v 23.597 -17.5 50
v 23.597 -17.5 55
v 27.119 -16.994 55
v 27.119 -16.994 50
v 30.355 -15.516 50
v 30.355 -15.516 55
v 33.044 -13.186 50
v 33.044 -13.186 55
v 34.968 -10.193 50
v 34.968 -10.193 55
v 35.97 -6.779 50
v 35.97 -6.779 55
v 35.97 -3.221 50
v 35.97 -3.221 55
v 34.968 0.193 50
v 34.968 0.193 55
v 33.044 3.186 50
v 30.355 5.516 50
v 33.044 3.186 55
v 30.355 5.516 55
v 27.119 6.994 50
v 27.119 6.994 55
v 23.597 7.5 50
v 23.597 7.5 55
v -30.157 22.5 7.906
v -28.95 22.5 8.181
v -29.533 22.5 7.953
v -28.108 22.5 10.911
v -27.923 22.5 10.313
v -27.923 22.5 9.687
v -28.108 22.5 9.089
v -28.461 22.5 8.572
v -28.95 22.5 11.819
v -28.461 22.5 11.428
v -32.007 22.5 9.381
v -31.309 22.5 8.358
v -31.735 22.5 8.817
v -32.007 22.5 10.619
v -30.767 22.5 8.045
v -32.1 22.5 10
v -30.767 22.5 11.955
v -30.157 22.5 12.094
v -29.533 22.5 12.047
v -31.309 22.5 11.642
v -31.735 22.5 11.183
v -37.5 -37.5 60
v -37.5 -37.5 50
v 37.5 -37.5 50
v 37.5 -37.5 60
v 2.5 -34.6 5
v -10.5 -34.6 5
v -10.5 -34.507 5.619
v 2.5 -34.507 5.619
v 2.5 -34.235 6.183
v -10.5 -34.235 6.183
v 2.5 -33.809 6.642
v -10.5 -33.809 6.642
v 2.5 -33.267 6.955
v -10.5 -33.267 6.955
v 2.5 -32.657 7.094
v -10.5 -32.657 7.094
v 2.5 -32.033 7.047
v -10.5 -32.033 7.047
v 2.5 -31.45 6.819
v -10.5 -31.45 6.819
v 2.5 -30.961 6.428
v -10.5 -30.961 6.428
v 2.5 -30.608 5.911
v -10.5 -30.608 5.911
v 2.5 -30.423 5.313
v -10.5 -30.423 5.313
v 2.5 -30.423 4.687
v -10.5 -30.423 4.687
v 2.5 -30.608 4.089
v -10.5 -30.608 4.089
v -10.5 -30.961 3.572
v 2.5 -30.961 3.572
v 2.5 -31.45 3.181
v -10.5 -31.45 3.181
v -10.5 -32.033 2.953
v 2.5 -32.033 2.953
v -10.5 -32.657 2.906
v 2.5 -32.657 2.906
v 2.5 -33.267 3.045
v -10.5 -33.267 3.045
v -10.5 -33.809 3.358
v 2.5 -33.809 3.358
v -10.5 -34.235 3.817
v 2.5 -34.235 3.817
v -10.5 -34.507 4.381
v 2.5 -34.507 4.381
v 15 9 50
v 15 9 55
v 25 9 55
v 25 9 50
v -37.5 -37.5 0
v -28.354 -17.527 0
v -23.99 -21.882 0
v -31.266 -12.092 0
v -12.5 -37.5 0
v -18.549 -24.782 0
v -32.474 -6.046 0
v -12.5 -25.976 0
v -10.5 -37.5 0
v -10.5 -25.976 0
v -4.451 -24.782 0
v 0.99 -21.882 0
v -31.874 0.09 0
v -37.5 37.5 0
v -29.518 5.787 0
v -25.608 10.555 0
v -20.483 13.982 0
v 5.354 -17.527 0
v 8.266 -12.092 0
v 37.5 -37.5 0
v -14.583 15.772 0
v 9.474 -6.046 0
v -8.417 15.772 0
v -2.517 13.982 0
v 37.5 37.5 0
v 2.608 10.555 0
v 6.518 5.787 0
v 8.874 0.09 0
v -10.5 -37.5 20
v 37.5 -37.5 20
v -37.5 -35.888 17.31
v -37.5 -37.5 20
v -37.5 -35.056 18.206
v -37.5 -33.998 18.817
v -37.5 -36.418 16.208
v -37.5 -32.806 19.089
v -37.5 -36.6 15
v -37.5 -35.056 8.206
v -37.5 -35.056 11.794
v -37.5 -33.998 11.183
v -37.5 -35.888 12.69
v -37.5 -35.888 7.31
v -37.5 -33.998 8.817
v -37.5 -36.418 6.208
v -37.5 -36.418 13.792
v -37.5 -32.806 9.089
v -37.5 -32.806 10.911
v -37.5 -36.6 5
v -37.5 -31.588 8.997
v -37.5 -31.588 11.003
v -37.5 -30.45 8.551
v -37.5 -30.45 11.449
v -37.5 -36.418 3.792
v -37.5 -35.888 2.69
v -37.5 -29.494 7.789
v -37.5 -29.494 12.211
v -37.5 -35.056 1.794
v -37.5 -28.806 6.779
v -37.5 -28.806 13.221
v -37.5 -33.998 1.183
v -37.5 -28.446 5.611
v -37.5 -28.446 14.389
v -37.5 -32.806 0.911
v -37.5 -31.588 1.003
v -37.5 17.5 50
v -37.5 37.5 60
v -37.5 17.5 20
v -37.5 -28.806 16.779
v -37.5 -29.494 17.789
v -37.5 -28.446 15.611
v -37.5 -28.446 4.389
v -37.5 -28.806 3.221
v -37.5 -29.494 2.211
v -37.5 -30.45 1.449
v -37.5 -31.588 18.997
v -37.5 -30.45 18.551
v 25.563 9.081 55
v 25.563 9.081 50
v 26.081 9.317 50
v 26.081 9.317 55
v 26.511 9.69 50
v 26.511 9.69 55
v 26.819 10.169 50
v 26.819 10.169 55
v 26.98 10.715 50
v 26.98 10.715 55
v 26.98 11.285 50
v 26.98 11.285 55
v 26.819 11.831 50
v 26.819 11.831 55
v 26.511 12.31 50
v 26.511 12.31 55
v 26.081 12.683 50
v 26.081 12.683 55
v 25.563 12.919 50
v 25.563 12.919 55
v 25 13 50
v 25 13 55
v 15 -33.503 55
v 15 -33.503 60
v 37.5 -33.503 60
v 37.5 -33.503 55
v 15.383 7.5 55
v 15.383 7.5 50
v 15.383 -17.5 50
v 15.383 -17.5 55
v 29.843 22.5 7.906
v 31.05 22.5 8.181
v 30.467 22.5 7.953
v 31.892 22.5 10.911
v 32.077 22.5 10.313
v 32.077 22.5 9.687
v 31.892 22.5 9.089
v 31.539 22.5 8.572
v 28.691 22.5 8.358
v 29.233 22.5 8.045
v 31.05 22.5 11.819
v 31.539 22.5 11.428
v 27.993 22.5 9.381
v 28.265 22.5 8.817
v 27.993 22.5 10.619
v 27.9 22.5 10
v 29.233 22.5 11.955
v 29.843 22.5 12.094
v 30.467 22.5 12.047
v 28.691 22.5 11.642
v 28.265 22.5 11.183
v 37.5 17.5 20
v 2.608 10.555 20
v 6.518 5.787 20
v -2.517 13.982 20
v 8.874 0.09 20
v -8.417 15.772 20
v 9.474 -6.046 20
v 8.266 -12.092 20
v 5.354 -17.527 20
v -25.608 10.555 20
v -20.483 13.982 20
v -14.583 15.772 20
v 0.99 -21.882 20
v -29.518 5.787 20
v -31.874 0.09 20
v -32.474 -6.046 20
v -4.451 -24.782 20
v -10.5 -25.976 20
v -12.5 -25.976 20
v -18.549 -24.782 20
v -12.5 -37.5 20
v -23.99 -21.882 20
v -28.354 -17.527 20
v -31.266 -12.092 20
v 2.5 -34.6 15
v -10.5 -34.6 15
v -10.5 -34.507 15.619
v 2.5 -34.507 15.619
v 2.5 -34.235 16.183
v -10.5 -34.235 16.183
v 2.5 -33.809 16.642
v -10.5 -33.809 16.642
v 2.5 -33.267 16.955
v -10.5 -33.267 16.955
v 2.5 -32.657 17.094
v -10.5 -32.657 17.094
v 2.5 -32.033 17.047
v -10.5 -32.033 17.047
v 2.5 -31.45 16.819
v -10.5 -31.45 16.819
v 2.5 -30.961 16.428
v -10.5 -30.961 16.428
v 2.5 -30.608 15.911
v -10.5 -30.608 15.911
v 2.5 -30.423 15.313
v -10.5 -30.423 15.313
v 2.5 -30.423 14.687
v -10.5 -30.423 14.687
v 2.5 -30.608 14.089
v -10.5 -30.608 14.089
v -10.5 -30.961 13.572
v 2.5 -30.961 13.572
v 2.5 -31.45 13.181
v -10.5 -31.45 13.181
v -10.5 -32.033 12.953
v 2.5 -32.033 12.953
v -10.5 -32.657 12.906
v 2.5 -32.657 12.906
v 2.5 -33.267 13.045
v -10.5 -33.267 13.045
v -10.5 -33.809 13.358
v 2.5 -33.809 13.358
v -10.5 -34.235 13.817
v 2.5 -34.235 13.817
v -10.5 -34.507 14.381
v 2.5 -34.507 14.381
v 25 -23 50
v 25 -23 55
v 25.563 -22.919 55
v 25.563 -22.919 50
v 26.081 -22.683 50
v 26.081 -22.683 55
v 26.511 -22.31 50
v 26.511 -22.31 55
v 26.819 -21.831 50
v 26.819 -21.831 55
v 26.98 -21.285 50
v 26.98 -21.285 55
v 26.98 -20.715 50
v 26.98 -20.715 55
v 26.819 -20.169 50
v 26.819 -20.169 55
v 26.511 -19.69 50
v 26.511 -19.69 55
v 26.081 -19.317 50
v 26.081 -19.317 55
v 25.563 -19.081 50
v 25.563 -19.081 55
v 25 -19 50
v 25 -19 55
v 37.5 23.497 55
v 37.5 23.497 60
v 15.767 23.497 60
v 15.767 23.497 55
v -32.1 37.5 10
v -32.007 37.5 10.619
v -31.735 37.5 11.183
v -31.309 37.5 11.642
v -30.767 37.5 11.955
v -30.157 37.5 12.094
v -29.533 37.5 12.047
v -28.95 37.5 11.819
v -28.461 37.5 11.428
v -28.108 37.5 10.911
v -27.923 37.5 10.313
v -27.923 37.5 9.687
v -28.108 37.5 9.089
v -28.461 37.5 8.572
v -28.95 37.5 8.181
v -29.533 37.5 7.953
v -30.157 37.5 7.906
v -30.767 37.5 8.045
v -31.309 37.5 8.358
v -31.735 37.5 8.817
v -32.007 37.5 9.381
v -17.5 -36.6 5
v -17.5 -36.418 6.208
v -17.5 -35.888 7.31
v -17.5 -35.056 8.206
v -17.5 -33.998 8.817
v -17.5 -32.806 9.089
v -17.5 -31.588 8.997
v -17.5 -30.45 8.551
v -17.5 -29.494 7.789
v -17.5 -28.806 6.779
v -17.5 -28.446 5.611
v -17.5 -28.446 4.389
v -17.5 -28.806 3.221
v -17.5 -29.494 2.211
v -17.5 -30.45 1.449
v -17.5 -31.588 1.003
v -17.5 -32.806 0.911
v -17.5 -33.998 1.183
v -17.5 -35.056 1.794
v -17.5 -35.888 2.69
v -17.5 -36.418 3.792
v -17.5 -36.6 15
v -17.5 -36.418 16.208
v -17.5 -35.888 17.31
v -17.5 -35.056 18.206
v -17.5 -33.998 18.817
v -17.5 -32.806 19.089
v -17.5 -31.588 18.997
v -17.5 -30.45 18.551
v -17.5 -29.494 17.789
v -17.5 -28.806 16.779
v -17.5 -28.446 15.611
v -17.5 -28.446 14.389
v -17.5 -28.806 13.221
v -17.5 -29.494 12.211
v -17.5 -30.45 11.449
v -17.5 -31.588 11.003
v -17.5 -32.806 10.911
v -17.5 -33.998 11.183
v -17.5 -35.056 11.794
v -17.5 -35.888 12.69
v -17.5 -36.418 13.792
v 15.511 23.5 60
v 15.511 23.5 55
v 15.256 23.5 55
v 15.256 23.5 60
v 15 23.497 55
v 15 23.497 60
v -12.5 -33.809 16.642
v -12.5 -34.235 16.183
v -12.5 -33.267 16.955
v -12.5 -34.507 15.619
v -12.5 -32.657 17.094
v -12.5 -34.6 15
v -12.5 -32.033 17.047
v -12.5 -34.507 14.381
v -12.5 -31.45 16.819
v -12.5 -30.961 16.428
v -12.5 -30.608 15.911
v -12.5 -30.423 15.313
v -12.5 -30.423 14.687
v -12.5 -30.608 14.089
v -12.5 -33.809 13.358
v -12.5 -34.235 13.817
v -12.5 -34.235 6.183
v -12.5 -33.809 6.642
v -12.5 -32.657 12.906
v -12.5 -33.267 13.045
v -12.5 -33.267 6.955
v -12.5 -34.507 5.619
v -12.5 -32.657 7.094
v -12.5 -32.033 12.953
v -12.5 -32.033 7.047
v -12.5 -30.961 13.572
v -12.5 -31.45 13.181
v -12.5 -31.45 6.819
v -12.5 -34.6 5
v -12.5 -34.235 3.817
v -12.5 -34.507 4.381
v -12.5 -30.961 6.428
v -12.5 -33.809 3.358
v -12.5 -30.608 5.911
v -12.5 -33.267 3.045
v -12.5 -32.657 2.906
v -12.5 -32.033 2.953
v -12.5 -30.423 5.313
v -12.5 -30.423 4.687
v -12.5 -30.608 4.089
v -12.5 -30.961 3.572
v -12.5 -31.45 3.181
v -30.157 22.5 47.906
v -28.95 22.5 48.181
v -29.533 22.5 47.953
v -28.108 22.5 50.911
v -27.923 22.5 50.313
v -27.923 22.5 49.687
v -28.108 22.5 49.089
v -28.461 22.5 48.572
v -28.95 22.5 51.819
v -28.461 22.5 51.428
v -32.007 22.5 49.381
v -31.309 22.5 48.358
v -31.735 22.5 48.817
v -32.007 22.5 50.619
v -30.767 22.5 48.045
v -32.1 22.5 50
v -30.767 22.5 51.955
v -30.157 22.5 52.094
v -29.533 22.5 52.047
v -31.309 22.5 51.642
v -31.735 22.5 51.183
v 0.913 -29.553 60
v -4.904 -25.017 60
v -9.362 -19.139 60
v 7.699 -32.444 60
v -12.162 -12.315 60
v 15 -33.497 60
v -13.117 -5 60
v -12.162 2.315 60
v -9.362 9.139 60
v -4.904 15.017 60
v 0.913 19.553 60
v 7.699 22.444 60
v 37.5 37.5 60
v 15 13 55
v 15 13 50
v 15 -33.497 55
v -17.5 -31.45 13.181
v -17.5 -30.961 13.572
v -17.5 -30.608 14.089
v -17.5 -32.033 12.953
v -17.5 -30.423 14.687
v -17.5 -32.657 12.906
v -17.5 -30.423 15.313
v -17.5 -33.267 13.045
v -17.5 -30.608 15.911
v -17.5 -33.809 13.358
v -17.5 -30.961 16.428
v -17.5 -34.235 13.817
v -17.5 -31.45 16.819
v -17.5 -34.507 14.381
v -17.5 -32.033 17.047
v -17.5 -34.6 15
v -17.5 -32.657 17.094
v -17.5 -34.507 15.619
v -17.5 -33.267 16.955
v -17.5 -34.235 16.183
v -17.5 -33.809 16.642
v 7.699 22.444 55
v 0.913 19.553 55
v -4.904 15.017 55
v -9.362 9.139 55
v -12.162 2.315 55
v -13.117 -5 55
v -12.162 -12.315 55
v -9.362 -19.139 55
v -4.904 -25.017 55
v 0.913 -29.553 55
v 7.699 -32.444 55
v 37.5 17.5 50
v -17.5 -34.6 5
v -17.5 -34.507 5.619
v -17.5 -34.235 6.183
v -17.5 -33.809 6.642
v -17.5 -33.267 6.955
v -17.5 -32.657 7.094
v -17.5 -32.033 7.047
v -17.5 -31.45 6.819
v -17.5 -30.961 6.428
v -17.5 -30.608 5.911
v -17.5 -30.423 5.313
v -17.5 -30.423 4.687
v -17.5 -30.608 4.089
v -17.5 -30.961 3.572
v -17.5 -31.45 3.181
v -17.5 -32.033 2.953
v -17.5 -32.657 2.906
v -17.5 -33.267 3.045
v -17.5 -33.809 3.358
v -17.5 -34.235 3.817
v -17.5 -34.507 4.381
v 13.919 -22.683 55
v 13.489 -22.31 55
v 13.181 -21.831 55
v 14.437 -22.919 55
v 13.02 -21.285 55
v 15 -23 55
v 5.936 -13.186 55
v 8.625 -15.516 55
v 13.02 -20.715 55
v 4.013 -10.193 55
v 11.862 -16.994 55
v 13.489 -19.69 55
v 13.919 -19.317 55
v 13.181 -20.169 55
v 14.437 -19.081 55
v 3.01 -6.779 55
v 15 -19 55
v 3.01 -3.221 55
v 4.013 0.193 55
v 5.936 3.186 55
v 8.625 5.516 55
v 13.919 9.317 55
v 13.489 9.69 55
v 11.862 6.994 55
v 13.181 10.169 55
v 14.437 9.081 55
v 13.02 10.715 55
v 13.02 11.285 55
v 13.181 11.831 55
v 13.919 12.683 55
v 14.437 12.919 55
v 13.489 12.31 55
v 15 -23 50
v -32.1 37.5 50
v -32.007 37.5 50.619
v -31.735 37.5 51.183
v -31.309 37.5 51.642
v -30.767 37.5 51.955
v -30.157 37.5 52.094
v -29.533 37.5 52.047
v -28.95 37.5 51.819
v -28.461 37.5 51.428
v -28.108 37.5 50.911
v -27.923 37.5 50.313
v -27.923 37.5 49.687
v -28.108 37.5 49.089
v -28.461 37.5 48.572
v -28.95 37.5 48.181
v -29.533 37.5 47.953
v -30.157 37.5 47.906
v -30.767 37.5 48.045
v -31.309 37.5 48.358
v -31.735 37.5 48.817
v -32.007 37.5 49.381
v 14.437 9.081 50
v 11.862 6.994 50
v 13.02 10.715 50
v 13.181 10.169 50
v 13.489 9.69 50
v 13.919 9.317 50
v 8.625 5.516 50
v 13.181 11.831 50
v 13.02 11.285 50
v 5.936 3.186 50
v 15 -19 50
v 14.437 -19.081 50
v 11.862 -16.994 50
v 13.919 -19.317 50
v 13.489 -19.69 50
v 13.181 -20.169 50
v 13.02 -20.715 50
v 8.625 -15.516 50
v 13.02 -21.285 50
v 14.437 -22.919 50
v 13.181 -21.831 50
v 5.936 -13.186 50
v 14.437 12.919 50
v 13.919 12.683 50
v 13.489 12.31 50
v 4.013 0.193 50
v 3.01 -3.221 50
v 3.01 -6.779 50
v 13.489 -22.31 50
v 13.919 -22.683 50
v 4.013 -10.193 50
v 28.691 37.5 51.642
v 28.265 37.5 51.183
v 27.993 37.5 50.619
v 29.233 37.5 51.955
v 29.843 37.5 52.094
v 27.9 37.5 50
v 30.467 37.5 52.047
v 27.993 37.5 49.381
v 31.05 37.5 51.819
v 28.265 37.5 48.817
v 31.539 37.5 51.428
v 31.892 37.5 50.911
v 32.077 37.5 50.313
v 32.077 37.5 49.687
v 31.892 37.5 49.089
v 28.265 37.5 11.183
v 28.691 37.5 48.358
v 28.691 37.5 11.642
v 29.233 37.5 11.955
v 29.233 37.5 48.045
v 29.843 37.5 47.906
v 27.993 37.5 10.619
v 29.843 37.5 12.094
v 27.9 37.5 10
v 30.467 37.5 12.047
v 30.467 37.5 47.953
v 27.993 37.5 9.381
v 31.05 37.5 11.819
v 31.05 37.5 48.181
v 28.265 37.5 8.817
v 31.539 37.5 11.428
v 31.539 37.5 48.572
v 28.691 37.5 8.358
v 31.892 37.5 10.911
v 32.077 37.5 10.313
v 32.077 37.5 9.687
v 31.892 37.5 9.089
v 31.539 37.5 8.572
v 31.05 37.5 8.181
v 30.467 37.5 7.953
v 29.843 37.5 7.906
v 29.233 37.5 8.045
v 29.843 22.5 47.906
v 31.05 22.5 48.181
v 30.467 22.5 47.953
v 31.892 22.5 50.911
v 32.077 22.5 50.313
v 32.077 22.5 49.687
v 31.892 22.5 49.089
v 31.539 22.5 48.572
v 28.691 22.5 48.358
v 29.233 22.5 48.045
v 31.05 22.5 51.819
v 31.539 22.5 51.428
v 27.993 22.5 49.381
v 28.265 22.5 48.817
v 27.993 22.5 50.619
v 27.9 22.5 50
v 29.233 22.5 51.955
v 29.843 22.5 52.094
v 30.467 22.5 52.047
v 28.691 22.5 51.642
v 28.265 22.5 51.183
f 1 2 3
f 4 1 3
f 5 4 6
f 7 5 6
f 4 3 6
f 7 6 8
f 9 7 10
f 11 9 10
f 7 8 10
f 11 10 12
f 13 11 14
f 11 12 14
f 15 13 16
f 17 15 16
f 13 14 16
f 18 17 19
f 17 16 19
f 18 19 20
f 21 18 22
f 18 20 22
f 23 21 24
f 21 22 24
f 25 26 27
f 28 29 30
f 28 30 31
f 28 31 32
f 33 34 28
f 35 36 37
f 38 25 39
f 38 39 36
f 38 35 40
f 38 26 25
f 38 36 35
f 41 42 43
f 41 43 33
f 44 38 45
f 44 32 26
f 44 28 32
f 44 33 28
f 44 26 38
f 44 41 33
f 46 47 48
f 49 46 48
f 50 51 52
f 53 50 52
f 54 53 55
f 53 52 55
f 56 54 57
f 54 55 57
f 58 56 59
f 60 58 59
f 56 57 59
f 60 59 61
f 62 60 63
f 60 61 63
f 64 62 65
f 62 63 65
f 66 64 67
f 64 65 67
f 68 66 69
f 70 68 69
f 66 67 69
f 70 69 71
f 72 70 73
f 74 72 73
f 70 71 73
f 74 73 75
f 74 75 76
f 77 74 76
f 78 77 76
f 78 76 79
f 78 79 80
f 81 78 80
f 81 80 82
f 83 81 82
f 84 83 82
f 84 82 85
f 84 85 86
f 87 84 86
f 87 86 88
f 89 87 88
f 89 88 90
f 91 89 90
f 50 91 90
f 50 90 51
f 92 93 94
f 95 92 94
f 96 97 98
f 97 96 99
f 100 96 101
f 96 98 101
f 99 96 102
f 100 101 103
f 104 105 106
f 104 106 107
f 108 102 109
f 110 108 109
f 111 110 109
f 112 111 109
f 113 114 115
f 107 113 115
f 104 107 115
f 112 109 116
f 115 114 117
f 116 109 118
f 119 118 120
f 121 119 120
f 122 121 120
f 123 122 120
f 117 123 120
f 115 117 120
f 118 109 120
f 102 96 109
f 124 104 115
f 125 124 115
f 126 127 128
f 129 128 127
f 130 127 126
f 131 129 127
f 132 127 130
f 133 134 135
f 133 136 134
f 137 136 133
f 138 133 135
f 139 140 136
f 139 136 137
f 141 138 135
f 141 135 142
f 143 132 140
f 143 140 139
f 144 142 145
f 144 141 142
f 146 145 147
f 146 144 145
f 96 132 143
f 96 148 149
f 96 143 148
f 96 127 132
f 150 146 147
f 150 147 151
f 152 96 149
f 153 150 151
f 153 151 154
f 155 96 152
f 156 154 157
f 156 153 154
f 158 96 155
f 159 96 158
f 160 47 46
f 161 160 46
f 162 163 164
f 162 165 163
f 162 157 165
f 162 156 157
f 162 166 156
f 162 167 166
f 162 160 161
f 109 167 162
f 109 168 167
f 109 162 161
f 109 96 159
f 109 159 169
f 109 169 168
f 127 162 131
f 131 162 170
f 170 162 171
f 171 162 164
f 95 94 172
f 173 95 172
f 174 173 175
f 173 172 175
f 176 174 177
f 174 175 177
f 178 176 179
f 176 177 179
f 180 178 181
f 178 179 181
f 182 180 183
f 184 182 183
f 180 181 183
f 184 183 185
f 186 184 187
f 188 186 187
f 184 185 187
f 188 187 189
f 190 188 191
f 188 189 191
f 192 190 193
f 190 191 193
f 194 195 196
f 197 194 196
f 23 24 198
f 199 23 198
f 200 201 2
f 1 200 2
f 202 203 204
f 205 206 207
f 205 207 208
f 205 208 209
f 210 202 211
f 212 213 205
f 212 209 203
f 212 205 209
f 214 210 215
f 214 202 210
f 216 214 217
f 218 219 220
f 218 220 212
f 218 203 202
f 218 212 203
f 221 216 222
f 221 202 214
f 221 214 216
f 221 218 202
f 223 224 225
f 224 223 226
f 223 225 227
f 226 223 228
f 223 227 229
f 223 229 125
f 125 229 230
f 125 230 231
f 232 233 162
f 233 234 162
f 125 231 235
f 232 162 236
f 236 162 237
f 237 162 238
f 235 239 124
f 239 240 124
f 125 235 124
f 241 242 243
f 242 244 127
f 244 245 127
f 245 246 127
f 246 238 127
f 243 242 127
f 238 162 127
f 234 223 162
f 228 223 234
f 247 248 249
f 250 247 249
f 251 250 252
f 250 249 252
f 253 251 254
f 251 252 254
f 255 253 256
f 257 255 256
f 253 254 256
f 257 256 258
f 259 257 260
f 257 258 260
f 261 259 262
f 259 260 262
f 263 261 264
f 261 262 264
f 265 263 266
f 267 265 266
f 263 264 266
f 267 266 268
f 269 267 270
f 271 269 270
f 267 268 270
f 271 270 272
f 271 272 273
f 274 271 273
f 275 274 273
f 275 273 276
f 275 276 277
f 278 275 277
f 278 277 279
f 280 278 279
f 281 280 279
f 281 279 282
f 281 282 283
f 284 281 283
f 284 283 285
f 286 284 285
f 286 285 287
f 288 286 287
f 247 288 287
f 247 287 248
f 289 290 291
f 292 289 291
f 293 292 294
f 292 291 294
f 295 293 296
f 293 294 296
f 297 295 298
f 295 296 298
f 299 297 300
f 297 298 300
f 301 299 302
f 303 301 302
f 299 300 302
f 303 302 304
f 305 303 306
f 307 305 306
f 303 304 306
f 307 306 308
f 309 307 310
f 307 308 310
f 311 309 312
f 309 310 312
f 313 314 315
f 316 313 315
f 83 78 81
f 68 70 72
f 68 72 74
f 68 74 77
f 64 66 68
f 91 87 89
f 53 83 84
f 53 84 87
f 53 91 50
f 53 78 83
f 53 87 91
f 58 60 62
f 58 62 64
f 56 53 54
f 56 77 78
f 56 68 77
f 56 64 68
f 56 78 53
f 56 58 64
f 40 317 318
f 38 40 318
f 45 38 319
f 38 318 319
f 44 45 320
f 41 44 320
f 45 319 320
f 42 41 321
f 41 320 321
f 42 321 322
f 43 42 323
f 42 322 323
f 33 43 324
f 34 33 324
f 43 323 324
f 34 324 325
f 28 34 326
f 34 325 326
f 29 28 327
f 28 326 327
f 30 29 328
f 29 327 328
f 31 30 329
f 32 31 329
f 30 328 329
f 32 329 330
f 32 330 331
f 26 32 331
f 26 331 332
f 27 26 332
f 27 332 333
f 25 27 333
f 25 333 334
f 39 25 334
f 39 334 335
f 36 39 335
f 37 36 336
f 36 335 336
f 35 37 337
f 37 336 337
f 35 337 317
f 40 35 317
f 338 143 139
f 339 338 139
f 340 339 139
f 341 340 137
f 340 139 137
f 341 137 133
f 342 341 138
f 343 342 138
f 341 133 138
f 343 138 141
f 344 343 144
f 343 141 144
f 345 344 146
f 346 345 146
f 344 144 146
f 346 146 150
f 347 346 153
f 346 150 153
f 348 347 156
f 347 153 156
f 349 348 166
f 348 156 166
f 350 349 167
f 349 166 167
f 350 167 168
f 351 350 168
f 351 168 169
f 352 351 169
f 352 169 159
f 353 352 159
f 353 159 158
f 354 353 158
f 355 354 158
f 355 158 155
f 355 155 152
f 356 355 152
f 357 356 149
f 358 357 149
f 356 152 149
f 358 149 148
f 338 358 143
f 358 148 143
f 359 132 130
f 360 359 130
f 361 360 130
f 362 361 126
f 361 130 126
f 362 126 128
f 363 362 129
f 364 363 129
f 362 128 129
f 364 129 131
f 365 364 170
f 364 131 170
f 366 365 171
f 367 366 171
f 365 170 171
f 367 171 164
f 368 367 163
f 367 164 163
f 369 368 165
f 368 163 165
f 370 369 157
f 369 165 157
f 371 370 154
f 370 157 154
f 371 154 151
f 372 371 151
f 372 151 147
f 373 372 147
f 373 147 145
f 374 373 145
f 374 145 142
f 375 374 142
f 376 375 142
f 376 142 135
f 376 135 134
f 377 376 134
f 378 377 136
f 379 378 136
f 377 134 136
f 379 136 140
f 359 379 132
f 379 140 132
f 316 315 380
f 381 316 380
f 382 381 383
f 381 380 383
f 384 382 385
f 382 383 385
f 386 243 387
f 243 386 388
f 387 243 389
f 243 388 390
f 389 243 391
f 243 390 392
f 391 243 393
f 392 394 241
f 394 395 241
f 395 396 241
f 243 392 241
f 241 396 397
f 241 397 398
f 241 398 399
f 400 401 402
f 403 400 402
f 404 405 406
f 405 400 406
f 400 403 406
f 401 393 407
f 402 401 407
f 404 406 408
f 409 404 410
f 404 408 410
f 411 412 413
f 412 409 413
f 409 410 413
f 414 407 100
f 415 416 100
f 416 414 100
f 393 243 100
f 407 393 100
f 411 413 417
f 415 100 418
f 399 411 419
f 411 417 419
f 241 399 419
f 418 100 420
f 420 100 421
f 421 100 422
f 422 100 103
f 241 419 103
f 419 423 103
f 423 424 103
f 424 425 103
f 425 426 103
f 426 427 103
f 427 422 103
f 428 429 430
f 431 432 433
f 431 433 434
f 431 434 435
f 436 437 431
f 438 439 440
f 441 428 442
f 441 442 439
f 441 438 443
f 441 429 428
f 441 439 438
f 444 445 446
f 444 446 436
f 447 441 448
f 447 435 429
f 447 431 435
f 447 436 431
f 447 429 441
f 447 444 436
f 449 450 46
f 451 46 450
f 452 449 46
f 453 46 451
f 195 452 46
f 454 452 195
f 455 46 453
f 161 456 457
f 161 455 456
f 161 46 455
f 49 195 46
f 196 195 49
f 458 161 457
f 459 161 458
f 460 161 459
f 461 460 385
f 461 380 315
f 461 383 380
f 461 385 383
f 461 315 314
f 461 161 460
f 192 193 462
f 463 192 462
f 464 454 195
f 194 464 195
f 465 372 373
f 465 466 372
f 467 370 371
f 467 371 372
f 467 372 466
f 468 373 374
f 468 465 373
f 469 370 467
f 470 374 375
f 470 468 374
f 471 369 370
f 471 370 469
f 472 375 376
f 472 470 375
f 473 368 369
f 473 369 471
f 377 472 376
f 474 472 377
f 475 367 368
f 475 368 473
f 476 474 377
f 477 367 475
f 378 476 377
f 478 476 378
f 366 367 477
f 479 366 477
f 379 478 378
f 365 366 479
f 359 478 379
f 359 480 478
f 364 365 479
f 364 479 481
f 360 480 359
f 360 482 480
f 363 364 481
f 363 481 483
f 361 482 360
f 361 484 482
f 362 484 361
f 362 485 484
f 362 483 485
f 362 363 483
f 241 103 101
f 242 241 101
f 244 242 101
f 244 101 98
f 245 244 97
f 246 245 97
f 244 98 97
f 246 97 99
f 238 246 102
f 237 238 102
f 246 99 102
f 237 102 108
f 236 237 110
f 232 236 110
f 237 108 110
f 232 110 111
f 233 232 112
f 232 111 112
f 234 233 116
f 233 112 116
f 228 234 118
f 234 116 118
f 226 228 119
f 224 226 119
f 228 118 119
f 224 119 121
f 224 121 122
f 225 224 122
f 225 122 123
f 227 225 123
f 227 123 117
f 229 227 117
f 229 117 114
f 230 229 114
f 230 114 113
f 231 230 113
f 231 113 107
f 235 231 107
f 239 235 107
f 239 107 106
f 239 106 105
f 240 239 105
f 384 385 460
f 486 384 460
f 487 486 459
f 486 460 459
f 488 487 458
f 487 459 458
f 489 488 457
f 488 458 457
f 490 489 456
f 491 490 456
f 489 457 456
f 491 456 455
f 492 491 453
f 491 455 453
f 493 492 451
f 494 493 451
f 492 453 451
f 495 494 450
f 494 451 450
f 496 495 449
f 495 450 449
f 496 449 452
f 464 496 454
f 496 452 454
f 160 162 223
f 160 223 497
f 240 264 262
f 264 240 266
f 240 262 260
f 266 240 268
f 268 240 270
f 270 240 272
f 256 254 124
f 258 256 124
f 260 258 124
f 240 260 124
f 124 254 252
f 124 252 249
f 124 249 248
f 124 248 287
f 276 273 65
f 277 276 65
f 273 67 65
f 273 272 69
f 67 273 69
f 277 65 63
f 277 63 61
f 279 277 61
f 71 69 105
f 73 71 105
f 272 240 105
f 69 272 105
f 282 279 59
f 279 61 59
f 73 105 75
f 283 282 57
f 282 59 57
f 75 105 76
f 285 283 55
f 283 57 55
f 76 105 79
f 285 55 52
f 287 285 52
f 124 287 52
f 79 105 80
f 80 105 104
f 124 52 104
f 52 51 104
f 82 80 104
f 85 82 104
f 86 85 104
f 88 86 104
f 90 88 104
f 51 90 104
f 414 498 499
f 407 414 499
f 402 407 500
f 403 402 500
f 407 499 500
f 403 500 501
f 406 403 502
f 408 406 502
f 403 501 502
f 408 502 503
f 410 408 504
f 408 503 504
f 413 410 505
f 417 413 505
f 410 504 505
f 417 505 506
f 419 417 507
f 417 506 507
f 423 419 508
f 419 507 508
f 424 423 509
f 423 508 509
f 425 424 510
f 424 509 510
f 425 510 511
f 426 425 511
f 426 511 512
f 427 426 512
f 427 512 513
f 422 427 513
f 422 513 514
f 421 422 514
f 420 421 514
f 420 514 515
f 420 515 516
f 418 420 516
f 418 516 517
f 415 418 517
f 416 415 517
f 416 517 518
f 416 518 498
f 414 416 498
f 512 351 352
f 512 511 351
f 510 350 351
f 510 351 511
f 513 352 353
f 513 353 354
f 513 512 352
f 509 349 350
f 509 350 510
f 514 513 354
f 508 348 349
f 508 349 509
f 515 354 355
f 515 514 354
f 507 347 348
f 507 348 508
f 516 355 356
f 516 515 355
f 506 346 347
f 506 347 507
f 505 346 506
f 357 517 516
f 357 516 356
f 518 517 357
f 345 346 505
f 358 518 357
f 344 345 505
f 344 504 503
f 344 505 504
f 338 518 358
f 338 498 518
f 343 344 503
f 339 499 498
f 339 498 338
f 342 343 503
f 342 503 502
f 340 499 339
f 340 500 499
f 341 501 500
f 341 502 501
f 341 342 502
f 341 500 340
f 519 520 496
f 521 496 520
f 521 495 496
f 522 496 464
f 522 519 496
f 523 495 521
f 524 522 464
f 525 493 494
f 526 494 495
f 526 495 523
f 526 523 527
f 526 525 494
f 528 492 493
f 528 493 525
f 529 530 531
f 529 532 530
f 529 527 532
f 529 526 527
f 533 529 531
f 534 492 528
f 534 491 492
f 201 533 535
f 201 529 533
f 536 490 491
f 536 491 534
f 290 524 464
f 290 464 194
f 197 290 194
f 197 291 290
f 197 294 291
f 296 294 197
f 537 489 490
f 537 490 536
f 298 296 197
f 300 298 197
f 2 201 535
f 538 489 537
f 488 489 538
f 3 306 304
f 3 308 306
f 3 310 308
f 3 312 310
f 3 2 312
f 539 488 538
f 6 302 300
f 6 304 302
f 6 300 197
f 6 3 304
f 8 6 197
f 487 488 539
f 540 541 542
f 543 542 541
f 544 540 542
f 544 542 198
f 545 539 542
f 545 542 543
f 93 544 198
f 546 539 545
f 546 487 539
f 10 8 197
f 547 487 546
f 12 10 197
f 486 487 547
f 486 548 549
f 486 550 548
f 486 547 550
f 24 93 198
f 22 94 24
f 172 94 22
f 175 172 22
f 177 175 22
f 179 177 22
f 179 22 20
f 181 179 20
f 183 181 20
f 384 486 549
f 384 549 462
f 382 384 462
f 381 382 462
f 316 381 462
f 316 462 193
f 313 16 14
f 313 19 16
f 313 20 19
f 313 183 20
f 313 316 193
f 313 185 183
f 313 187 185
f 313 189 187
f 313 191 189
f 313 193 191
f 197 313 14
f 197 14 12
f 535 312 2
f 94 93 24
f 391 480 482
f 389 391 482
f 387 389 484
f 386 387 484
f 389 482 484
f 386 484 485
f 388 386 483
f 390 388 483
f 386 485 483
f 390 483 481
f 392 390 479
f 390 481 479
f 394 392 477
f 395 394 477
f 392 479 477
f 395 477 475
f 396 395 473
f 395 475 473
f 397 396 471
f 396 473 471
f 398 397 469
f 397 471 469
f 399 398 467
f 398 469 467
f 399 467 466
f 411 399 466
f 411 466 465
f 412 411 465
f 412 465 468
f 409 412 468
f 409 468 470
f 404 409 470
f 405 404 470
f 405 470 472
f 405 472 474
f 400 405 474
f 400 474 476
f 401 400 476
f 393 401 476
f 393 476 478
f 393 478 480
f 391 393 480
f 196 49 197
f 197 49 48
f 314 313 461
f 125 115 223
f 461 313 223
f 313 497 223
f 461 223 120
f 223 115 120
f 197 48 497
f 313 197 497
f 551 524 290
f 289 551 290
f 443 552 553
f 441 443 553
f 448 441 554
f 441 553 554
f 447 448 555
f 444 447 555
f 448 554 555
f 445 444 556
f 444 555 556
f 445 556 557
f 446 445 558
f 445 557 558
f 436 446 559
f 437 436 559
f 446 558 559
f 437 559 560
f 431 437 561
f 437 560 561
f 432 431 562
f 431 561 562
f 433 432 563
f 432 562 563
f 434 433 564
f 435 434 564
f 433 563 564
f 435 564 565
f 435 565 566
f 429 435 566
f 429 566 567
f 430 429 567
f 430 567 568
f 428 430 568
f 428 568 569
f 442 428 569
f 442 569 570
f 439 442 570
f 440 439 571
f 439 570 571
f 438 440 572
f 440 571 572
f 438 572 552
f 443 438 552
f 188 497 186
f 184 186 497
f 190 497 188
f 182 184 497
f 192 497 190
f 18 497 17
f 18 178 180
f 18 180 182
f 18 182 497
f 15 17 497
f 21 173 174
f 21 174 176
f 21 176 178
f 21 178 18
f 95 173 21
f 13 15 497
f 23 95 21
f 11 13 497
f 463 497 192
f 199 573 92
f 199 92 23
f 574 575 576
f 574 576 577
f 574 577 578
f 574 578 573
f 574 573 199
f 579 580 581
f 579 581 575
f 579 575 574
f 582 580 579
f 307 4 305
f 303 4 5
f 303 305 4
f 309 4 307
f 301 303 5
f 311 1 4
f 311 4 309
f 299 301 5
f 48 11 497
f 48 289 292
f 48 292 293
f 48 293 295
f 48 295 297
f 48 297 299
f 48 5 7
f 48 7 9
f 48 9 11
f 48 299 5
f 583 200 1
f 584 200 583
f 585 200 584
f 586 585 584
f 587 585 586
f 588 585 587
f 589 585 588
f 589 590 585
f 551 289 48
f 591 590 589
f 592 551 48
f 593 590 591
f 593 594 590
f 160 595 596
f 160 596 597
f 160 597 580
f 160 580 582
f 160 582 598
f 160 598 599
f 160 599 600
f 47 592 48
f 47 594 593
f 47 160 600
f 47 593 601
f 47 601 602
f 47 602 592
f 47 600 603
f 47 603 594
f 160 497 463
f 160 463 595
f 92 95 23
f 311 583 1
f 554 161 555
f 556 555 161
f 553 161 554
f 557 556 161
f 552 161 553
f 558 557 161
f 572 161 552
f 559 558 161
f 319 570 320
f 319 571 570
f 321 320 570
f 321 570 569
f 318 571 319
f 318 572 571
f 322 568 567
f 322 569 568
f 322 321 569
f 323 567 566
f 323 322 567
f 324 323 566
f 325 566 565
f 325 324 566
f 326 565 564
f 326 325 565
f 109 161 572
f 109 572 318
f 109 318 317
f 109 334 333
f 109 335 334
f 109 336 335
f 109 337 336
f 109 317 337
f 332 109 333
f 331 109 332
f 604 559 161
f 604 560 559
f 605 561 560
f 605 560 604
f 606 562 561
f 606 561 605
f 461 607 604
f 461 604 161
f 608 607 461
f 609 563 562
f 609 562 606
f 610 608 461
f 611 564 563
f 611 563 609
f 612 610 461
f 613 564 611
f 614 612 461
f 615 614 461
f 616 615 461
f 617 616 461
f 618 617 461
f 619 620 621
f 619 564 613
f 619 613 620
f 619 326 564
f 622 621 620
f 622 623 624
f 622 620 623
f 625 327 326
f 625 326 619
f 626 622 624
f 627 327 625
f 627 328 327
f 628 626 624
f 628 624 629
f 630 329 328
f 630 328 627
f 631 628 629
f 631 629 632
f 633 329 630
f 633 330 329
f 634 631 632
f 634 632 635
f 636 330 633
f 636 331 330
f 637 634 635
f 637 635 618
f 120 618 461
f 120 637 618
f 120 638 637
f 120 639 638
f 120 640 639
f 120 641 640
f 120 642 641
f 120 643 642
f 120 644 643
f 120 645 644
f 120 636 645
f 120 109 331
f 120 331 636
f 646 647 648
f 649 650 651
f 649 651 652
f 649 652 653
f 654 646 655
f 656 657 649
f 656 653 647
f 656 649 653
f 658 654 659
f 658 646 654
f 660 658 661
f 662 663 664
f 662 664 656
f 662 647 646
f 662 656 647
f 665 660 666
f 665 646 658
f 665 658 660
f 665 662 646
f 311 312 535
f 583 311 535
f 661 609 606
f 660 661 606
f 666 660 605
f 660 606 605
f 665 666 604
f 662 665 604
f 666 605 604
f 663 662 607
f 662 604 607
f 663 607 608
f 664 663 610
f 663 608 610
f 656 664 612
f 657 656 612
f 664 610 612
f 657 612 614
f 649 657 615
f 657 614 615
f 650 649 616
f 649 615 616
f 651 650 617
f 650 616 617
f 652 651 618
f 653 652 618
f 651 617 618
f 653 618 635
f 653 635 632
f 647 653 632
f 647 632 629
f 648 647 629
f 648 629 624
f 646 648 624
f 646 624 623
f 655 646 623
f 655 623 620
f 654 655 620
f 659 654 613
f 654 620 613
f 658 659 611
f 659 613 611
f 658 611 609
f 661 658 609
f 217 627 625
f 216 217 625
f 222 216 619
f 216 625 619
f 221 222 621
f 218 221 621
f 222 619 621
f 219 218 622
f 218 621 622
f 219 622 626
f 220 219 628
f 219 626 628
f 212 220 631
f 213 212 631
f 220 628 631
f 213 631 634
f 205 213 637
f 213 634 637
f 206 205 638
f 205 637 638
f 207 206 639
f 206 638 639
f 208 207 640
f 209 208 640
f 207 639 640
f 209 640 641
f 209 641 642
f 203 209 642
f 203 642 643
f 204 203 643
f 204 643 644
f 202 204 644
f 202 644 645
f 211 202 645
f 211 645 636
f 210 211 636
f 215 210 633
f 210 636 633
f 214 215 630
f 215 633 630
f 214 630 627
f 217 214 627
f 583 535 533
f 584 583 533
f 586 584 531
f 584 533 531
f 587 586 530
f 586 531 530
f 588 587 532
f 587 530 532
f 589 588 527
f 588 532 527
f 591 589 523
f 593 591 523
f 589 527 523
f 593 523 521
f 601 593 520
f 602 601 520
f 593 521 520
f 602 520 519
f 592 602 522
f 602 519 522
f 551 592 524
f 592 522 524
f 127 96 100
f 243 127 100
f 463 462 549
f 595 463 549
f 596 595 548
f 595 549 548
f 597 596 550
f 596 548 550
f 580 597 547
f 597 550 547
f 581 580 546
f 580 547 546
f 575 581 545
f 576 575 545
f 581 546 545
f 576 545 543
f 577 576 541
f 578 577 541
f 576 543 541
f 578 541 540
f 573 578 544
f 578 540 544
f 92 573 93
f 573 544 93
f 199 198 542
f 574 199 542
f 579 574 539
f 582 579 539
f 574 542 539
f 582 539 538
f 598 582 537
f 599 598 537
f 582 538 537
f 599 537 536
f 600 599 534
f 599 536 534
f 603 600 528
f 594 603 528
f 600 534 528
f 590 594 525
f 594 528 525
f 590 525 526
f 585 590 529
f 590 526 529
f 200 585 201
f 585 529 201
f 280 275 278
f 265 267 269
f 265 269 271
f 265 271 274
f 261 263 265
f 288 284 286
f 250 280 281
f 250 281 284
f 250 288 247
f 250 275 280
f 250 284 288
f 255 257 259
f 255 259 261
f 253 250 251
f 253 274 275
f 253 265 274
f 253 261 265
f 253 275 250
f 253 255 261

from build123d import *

# Parameters (mm, degrees)
F0_W      = 75
F0_H      = 75
F1_DEPTH  = 60
F2_W      = 55
F2_H      = 30
F3_DEPTH  = 75.001
F5_DEPTH  = 25
F6_R      = 2.1
F7_DEPTH  = 40
F8_R      = 4.1
F9_DEPTH  = 20
F11_DEPTH = 25
F13_DEPTH = 5
F14_R     = 2.1
F15_DEPTH = 15


with BuildPart() as f1:
    # F0 (on Top) → F1 (new body)
    with BuildSketch(Plane.XY):
        Rectangle(F0_W, F0_H)
    extrude(amount=F1_DEPTH)

    # F2 (on face) → F3 (cut, through all)
    with BuildSketch(Plane(origin=(-37.5, 0, 0), x_dir=(0, -1, 0), z_dir=(-1, 0, 0))):
        with Locations((10, 35)):
            Rectangle(F2_W, F2_H)
    extrude(amount=-F3_DEPTH, mode=Mode.SUBTRACT)

    # F4 (on face) → F5 (cut)
    with BuildSketch(Plane(origin=(0, 0, 0), x_dir=(1, 0, 0), z_dir=(0, 0, -1))):
        with BuildLine():
            Line((-12.5, 37.5), (-12.5, 25.976177))
            ThreePointArc((-12.5, 25.976177), (-11.5, -16), (-10.5, 25.976177))
            Line((-10.5, 25.976177), (-10.5, 37.5))
            Line((-10.5, 37.5), (-12.5, 37.5))
        make_face()
    extrude(amount=-F5_DEPTH, mode=Mode.SUBTRACT)

    # F6 (on face) → F7 (cut)
    with BuildSketch(Plane(origin=(-37.5, 0, 0), x_dir=(0, -1, 0), z_dir=(-1, 0, 0))):
        with Locations((32.5, 15)):
            Circle(F6_R)
        with Locations((32.5, 5)):
            Circle(F6_R)
    extrude(amount=-F7_DEPTH, mode=Mode.SUBTRACT)

    # F8 (on face) → F9 (cut)
    with BuildSketch(Plane(origin=(-37.5, 0, 0), x_dir=(0, -1, 0), z_dir=(-1, 0, 0))):
        with Locations((32.5, 15)):
            Circle(F8_R)
        with Locations((32.5, 5)):
            Circle(F8_R)
    extrude(amount=-F9_DEPTH, mode=Mode.SUBTRACT)

    # F10 (on face) → F11 (cut)
    with BuildSketch(Plane.XY.offset(60)):
        with BuildLine():
            ThreePointArc((15, 13), (13, 11), (15, 9))
            Line((15, 9), (25, 9))
            ThreePointArc((25, 9), (27, 11), (25, 13))
            Line((25, 13), (15, 13))
        make_face()
        with BuildLine():
            ThreePointArc((15, -19), (13, -21), (15, -23))
            Line((15, -23), (25, -23))
            ThreePointArc((25, -23), (27, -21), (25, -19))
            Line((25, -19), (15, -19))
        make_face()
        with BuildLine():
            Line((15.383265, -17.5), (23.597296, -17.5))
            ThreePointArc((23.597296, -17.5), (36.097296, -5), (23.597296, 7.5))
            Line((23.597296, 7.5), (15.383265, 7.5))
            ThreePointArc((15.383265, 7.5), (2.883265, -5), (15.383265, -17.5))
        make_face()
    extrude(amount=-F11_DEPTH, mode=Mode.SUBTRACT)

    # F12 (on face) → F13 (cut)
    with BuildSketch(Plane.XY.offset(60)):
        with BuildLine():
            Line((15, 23.497423), (15.76653, 23.497423))
            ThreePointArc((15.76653, 23.497423), (15.383265, 23.5), (15, 23.497423))
        make_face()
        with BuildLine():
            Line((72, 23.497423), (15.76653, 23.497423))
            Line((15.76653, 23.497423), (15, 23.497423))
            ThreePointArc((15, 23.497423), (-13.116735, -5), (15, -33.497423))
            Line((15, -33.497423), (15, -33.502577))
            Line((15, -33.502577), (72, -33.502577))
            Line((72, -33.502577), (72, 23.497423))
        make_face()
    extrude(amount=-F13_DEPTH, mode=Mode.SUBTRACT)

    # F14 (on face) → F15 (cut)
    with BuildSketch(Plane(origin=(0, 37.5, 0), x_dir=(-1, 0, 0), z_dir=(0, 1, 0))):
        with Locations((-30, 50)):
            Circle(F14_R)
        with Locations((30, 50)):
            Circle(F14_R)
        with Locations((30, 10)):
            Circle(F14_R)
        with Locations((-30, 10)):
            Circle(F14_R)
    extrude(amount=-F15_DEPTH, mode=Mode.SUBTRACT)


solid = f1.part
